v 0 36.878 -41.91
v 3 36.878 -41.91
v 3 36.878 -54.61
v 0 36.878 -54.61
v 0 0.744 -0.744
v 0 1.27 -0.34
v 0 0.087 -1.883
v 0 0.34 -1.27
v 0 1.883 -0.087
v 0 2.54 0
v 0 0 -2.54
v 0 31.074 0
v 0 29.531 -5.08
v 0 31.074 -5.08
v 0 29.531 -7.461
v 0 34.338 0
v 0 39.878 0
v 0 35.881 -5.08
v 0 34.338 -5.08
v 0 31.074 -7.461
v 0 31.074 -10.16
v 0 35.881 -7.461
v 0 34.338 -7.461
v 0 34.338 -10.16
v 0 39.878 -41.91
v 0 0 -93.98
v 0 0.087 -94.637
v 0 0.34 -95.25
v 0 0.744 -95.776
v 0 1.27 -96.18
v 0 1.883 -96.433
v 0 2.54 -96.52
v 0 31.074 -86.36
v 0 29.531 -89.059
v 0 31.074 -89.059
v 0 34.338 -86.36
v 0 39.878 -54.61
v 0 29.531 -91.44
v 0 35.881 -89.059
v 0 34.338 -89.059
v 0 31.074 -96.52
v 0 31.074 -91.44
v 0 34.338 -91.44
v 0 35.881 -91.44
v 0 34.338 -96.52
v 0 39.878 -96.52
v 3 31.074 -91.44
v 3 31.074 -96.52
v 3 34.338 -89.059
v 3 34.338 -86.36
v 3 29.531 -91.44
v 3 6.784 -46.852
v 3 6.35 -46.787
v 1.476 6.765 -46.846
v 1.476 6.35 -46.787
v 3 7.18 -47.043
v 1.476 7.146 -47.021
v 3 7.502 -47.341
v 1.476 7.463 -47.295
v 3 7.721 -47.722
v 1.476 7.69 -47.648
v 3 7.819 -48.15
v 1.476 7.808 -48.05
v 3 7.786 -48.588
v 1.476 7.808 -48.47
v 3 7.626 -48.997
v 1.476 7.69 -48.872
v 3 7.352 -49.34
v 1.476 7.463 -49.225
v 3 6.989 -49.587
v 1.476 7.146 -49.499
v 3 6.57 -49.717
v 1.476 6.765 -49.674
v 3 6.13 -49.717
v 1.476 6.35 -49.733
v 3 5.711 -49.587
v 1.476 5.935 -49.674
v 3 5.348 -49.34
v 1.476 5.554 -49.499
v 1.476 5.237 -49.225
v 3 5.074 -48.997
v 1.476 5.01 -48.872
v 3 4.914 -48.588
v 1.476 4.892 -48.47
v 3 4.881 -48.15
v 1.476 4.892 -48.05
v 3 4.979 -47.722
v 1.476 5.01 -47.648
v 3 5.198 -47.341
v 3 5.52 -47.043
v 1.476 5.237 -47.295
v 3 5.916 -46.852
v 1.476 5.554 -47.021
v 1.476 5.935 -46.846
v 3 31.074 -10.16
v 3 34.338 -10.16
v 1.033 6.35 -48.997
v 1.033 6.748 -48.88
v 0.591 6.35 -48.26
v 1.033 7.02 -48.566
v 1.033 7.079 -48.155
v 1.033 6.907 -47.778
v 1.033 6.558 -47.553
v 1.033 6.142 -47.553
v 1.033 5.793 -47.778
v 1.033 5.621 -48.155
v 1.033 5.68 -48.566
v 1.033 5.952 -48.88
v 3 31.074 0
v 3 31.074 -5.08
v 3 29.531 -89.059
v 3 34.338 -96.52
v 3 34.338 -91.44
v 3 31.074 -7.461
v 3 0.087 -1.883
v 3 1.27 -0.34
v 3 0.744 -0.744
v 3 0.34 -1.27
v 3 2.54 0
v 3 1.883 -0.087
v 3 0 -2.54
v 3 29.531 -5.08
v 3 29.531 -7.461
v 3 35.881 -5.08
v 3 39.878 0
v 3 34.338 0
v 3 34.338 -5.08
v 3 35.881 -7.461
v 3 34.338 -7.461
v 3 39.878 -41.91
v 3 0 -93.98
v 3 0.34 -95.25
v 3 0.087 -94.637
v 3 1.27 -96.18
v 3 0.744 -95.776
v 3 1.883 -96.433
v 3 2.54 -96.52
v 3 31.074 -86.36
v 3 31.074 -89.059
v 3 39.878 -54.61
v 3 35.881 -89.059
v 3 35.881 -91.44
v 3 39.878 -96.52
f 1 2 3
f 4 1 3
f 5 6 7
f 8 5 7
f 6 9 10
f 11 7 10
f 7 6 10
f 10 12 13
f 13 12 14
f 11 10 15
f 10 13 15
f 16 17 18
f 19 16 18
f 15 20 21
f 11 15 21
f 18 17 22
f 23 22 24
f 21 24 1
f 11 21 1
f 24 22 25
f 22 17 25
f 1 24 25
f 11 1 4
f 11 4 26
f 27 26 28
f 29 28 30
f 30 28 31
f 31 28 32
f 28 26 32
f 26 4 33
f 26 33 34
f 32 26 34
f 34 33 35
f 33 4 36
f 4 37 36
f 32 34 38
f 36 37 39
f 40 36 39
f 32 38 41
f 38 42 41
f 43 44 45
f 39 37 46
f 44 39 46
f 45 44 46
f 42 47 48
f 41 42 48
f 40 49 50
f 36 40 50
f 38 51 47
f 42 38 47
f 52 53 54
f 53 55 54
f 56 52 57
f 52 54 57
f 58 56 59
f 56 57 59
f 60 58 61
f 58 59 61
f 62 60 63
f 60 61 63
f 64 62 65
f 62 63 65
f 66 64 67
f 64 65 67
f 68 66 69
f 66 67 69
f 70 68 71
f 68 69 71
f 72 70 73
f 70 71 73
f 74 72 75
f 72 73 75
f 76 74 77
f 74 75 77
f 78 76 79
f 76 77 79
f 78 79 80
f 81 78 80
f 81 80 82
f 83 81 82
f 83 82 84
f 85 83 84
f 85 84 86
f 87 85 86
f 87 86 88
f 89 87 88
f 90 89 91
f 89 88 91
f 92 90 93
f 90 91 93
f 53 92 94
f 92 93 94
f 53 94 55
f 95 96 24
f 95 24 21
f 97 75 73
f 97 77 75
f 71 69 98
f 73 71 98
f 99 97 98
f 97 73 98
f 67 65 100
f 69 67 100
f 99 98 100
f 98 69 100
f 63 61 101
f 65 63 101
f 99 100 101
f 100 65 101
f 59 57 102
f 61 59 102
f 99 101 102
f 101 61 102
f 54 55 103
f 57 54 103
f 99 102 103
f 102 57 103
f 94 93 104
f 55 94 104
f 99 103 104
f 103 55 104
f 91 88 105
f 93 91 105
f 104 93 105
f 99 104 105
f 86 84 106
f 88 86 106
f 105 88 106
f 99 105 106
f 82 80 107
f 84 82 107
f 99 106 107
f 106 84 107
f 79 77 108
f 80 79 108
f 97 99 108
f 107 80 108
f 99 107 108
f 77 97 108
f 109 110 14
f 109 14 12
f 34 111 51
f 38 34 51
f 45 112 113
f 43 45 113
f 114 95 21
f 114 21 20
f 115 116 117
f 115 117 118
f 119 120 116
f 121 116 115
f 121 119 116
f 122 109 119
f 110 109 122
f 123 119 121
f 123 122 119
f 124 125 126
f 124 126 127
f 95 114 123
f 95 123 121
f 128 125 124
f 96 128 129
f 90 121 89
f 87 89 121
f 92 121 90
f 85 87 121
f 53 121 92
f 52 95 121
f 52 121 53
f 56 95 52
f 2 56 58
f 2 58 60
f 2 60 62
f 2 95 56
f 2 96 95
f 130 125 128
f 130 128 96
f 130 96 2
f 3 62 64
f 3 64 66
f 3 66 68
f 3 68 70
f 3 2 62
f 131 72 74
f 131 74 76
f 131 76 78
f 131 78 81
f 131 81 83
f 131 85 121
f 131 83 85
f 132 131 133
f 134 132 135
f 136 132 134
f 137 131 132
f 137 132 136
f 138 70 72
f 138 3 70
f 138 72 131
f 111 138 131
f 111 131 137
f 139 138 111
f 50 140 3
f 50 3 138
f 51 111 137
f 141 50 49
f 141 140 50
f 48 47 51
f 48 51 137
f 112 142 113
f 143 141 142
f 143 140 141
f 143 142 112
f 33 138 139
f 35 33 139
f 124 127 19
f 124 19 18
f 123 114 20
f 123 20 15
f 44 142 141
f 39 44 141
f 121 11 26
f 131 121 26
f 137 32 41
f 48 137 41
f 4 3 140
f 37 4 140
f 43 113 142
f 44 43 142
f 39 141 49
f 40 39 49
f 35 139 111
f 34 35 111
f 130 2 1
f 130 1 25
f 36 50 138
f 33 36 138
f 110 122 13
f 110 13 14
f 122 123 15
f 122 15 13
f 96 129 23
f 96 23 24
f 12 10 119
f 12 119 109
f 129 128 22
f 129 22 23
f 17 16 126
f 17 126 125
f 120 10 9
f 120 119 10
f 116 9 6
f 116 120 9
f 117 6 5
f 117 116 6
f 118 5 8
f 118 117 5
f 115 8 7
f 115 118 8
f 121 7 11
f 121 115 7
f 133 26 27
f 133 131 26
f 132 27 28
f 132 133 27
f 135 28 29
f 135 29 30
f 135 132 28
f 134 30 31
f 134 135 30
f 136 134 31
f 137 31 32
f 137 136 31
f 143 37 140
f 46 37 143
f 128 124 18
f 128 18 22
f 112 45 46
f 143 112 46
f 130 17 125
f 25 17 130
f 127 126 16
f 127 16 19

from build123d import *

# Parameters (mm, degrees)
SKETCH1_W                       = 96.52
SKETCH1_H                       = 39.878
BOSS_EXTRUDE1_DEPTH             = 3
F_32_0_116_DIAMETER_HOLE1_D     = 2.9464
F_32_0_116_DIAMETER_HOLE1_DEPTH = 1.524
F_32_0_116_DIAMETER_HOLE1_TIP   = 0.885187864
CUT_EXTRUDE1_DEPTH              = 3
FILLET1_R                       = 2.54
SKETCH5_W                       = 12.7
SKETCH5_H                       = 3
CUT_EXTRUDE2_DEPTH              = 3


with BuildPart() as part:
    # Sketch1 → Boss-Extrude1 (new body)
    with BuildSketch(Plane(origin=(0, 0, 0), x_dir=(0, 0, -1), z_dir=(1, 0, 0))):
        with Locations((48.26, 19.939)):
            Rectangle(SKETCH1_W, SKETCH1_H)
    extrude(amount=BOSS_EXTRUDE1_DEPTH)

    # #32 (0.116) Diameter Hole1
    with Locations(Plane(origin=(3, 0, 0), x_dir=(0, 0, -1), z_dir=(1, 0, 0))):
        with Locations((48.26, 6.35)):
            Hole(F_32_0_116_DIAMETER_HOLE1_D / 2, depth=F_32_0_116_DIAMETER_HOLE1_DEPTH)
            with Locations((0, 0, -(F_32_0_116_DIAMETER_HOLE1_DEPTH + F_32_0_116_DIAMETER_HOLE1_TIP / 2))):  # 118° drill point
                Cone(0, F_32_0_116_DIAMETER_HOLE1_D / 2, F_32_0_116_DIAMETER_HOLE1_TIP, mode=Mode.SUBTRACT)

    # Sketch4 → Cut-Extrude1 (cut)
    with BuildSketch(Plane(origin=(3, 0, 0), x_dir=(0, 0, -1), z_dir=(1, 0, 0))):
        Polygon((0, 34.338), (5.08, 34.338), (5.08, 35.88105), (7.46125, 35.88105), (7.46125, 34.338), (10.16, 34.338), (10.16, 31.0741), (7.46125, 31.0741), (7.46125, 29.53105), (5.08, 29.53105), (5.08, 31.0741), (0, 31.0741), align=None)
        Polygon((96.52, 31.0741), (96.52, 34.338), (91.44, 34.338), (91.44, 35.88105), (89.05875, 35.88105), (89.05875, 34.338), (86.36, 34.338), (86.36, 31.0741), (89.05875, 31.0741), (89.05875, 29.53105), (91.44, 29.53105), (91.44, 31.0741), align=None)
    extrude(amount=-CUT_EXTRUDE1_DEPTH, mode=Mode.SUBTRACT)

    # Fillet1
    fillet1_edges = [part.edges().sort_by_distance(p)[0] for p in [
        (1.5, 0, -96.52),
        (1.5, 0, 0),
    ]]
    fillet(fillet1_edges, radius=FILLET1_R)

    # Sketch5 → Cut-Extrude2 (cut)
    with BuildSketch(Plane(origin=(3, 0, 0), x_dir=(0, 0, -1), z_dir=(1, 0, 0))):
        with Locations((48.26, 38.378)):
            Rectangle(SKETCH5_W, SKETCH5_H)
    extrude(amount=-CUT_EXTRUDE2_DEPTH, mode=Mode.SUBTRACT)


solid = part.part
